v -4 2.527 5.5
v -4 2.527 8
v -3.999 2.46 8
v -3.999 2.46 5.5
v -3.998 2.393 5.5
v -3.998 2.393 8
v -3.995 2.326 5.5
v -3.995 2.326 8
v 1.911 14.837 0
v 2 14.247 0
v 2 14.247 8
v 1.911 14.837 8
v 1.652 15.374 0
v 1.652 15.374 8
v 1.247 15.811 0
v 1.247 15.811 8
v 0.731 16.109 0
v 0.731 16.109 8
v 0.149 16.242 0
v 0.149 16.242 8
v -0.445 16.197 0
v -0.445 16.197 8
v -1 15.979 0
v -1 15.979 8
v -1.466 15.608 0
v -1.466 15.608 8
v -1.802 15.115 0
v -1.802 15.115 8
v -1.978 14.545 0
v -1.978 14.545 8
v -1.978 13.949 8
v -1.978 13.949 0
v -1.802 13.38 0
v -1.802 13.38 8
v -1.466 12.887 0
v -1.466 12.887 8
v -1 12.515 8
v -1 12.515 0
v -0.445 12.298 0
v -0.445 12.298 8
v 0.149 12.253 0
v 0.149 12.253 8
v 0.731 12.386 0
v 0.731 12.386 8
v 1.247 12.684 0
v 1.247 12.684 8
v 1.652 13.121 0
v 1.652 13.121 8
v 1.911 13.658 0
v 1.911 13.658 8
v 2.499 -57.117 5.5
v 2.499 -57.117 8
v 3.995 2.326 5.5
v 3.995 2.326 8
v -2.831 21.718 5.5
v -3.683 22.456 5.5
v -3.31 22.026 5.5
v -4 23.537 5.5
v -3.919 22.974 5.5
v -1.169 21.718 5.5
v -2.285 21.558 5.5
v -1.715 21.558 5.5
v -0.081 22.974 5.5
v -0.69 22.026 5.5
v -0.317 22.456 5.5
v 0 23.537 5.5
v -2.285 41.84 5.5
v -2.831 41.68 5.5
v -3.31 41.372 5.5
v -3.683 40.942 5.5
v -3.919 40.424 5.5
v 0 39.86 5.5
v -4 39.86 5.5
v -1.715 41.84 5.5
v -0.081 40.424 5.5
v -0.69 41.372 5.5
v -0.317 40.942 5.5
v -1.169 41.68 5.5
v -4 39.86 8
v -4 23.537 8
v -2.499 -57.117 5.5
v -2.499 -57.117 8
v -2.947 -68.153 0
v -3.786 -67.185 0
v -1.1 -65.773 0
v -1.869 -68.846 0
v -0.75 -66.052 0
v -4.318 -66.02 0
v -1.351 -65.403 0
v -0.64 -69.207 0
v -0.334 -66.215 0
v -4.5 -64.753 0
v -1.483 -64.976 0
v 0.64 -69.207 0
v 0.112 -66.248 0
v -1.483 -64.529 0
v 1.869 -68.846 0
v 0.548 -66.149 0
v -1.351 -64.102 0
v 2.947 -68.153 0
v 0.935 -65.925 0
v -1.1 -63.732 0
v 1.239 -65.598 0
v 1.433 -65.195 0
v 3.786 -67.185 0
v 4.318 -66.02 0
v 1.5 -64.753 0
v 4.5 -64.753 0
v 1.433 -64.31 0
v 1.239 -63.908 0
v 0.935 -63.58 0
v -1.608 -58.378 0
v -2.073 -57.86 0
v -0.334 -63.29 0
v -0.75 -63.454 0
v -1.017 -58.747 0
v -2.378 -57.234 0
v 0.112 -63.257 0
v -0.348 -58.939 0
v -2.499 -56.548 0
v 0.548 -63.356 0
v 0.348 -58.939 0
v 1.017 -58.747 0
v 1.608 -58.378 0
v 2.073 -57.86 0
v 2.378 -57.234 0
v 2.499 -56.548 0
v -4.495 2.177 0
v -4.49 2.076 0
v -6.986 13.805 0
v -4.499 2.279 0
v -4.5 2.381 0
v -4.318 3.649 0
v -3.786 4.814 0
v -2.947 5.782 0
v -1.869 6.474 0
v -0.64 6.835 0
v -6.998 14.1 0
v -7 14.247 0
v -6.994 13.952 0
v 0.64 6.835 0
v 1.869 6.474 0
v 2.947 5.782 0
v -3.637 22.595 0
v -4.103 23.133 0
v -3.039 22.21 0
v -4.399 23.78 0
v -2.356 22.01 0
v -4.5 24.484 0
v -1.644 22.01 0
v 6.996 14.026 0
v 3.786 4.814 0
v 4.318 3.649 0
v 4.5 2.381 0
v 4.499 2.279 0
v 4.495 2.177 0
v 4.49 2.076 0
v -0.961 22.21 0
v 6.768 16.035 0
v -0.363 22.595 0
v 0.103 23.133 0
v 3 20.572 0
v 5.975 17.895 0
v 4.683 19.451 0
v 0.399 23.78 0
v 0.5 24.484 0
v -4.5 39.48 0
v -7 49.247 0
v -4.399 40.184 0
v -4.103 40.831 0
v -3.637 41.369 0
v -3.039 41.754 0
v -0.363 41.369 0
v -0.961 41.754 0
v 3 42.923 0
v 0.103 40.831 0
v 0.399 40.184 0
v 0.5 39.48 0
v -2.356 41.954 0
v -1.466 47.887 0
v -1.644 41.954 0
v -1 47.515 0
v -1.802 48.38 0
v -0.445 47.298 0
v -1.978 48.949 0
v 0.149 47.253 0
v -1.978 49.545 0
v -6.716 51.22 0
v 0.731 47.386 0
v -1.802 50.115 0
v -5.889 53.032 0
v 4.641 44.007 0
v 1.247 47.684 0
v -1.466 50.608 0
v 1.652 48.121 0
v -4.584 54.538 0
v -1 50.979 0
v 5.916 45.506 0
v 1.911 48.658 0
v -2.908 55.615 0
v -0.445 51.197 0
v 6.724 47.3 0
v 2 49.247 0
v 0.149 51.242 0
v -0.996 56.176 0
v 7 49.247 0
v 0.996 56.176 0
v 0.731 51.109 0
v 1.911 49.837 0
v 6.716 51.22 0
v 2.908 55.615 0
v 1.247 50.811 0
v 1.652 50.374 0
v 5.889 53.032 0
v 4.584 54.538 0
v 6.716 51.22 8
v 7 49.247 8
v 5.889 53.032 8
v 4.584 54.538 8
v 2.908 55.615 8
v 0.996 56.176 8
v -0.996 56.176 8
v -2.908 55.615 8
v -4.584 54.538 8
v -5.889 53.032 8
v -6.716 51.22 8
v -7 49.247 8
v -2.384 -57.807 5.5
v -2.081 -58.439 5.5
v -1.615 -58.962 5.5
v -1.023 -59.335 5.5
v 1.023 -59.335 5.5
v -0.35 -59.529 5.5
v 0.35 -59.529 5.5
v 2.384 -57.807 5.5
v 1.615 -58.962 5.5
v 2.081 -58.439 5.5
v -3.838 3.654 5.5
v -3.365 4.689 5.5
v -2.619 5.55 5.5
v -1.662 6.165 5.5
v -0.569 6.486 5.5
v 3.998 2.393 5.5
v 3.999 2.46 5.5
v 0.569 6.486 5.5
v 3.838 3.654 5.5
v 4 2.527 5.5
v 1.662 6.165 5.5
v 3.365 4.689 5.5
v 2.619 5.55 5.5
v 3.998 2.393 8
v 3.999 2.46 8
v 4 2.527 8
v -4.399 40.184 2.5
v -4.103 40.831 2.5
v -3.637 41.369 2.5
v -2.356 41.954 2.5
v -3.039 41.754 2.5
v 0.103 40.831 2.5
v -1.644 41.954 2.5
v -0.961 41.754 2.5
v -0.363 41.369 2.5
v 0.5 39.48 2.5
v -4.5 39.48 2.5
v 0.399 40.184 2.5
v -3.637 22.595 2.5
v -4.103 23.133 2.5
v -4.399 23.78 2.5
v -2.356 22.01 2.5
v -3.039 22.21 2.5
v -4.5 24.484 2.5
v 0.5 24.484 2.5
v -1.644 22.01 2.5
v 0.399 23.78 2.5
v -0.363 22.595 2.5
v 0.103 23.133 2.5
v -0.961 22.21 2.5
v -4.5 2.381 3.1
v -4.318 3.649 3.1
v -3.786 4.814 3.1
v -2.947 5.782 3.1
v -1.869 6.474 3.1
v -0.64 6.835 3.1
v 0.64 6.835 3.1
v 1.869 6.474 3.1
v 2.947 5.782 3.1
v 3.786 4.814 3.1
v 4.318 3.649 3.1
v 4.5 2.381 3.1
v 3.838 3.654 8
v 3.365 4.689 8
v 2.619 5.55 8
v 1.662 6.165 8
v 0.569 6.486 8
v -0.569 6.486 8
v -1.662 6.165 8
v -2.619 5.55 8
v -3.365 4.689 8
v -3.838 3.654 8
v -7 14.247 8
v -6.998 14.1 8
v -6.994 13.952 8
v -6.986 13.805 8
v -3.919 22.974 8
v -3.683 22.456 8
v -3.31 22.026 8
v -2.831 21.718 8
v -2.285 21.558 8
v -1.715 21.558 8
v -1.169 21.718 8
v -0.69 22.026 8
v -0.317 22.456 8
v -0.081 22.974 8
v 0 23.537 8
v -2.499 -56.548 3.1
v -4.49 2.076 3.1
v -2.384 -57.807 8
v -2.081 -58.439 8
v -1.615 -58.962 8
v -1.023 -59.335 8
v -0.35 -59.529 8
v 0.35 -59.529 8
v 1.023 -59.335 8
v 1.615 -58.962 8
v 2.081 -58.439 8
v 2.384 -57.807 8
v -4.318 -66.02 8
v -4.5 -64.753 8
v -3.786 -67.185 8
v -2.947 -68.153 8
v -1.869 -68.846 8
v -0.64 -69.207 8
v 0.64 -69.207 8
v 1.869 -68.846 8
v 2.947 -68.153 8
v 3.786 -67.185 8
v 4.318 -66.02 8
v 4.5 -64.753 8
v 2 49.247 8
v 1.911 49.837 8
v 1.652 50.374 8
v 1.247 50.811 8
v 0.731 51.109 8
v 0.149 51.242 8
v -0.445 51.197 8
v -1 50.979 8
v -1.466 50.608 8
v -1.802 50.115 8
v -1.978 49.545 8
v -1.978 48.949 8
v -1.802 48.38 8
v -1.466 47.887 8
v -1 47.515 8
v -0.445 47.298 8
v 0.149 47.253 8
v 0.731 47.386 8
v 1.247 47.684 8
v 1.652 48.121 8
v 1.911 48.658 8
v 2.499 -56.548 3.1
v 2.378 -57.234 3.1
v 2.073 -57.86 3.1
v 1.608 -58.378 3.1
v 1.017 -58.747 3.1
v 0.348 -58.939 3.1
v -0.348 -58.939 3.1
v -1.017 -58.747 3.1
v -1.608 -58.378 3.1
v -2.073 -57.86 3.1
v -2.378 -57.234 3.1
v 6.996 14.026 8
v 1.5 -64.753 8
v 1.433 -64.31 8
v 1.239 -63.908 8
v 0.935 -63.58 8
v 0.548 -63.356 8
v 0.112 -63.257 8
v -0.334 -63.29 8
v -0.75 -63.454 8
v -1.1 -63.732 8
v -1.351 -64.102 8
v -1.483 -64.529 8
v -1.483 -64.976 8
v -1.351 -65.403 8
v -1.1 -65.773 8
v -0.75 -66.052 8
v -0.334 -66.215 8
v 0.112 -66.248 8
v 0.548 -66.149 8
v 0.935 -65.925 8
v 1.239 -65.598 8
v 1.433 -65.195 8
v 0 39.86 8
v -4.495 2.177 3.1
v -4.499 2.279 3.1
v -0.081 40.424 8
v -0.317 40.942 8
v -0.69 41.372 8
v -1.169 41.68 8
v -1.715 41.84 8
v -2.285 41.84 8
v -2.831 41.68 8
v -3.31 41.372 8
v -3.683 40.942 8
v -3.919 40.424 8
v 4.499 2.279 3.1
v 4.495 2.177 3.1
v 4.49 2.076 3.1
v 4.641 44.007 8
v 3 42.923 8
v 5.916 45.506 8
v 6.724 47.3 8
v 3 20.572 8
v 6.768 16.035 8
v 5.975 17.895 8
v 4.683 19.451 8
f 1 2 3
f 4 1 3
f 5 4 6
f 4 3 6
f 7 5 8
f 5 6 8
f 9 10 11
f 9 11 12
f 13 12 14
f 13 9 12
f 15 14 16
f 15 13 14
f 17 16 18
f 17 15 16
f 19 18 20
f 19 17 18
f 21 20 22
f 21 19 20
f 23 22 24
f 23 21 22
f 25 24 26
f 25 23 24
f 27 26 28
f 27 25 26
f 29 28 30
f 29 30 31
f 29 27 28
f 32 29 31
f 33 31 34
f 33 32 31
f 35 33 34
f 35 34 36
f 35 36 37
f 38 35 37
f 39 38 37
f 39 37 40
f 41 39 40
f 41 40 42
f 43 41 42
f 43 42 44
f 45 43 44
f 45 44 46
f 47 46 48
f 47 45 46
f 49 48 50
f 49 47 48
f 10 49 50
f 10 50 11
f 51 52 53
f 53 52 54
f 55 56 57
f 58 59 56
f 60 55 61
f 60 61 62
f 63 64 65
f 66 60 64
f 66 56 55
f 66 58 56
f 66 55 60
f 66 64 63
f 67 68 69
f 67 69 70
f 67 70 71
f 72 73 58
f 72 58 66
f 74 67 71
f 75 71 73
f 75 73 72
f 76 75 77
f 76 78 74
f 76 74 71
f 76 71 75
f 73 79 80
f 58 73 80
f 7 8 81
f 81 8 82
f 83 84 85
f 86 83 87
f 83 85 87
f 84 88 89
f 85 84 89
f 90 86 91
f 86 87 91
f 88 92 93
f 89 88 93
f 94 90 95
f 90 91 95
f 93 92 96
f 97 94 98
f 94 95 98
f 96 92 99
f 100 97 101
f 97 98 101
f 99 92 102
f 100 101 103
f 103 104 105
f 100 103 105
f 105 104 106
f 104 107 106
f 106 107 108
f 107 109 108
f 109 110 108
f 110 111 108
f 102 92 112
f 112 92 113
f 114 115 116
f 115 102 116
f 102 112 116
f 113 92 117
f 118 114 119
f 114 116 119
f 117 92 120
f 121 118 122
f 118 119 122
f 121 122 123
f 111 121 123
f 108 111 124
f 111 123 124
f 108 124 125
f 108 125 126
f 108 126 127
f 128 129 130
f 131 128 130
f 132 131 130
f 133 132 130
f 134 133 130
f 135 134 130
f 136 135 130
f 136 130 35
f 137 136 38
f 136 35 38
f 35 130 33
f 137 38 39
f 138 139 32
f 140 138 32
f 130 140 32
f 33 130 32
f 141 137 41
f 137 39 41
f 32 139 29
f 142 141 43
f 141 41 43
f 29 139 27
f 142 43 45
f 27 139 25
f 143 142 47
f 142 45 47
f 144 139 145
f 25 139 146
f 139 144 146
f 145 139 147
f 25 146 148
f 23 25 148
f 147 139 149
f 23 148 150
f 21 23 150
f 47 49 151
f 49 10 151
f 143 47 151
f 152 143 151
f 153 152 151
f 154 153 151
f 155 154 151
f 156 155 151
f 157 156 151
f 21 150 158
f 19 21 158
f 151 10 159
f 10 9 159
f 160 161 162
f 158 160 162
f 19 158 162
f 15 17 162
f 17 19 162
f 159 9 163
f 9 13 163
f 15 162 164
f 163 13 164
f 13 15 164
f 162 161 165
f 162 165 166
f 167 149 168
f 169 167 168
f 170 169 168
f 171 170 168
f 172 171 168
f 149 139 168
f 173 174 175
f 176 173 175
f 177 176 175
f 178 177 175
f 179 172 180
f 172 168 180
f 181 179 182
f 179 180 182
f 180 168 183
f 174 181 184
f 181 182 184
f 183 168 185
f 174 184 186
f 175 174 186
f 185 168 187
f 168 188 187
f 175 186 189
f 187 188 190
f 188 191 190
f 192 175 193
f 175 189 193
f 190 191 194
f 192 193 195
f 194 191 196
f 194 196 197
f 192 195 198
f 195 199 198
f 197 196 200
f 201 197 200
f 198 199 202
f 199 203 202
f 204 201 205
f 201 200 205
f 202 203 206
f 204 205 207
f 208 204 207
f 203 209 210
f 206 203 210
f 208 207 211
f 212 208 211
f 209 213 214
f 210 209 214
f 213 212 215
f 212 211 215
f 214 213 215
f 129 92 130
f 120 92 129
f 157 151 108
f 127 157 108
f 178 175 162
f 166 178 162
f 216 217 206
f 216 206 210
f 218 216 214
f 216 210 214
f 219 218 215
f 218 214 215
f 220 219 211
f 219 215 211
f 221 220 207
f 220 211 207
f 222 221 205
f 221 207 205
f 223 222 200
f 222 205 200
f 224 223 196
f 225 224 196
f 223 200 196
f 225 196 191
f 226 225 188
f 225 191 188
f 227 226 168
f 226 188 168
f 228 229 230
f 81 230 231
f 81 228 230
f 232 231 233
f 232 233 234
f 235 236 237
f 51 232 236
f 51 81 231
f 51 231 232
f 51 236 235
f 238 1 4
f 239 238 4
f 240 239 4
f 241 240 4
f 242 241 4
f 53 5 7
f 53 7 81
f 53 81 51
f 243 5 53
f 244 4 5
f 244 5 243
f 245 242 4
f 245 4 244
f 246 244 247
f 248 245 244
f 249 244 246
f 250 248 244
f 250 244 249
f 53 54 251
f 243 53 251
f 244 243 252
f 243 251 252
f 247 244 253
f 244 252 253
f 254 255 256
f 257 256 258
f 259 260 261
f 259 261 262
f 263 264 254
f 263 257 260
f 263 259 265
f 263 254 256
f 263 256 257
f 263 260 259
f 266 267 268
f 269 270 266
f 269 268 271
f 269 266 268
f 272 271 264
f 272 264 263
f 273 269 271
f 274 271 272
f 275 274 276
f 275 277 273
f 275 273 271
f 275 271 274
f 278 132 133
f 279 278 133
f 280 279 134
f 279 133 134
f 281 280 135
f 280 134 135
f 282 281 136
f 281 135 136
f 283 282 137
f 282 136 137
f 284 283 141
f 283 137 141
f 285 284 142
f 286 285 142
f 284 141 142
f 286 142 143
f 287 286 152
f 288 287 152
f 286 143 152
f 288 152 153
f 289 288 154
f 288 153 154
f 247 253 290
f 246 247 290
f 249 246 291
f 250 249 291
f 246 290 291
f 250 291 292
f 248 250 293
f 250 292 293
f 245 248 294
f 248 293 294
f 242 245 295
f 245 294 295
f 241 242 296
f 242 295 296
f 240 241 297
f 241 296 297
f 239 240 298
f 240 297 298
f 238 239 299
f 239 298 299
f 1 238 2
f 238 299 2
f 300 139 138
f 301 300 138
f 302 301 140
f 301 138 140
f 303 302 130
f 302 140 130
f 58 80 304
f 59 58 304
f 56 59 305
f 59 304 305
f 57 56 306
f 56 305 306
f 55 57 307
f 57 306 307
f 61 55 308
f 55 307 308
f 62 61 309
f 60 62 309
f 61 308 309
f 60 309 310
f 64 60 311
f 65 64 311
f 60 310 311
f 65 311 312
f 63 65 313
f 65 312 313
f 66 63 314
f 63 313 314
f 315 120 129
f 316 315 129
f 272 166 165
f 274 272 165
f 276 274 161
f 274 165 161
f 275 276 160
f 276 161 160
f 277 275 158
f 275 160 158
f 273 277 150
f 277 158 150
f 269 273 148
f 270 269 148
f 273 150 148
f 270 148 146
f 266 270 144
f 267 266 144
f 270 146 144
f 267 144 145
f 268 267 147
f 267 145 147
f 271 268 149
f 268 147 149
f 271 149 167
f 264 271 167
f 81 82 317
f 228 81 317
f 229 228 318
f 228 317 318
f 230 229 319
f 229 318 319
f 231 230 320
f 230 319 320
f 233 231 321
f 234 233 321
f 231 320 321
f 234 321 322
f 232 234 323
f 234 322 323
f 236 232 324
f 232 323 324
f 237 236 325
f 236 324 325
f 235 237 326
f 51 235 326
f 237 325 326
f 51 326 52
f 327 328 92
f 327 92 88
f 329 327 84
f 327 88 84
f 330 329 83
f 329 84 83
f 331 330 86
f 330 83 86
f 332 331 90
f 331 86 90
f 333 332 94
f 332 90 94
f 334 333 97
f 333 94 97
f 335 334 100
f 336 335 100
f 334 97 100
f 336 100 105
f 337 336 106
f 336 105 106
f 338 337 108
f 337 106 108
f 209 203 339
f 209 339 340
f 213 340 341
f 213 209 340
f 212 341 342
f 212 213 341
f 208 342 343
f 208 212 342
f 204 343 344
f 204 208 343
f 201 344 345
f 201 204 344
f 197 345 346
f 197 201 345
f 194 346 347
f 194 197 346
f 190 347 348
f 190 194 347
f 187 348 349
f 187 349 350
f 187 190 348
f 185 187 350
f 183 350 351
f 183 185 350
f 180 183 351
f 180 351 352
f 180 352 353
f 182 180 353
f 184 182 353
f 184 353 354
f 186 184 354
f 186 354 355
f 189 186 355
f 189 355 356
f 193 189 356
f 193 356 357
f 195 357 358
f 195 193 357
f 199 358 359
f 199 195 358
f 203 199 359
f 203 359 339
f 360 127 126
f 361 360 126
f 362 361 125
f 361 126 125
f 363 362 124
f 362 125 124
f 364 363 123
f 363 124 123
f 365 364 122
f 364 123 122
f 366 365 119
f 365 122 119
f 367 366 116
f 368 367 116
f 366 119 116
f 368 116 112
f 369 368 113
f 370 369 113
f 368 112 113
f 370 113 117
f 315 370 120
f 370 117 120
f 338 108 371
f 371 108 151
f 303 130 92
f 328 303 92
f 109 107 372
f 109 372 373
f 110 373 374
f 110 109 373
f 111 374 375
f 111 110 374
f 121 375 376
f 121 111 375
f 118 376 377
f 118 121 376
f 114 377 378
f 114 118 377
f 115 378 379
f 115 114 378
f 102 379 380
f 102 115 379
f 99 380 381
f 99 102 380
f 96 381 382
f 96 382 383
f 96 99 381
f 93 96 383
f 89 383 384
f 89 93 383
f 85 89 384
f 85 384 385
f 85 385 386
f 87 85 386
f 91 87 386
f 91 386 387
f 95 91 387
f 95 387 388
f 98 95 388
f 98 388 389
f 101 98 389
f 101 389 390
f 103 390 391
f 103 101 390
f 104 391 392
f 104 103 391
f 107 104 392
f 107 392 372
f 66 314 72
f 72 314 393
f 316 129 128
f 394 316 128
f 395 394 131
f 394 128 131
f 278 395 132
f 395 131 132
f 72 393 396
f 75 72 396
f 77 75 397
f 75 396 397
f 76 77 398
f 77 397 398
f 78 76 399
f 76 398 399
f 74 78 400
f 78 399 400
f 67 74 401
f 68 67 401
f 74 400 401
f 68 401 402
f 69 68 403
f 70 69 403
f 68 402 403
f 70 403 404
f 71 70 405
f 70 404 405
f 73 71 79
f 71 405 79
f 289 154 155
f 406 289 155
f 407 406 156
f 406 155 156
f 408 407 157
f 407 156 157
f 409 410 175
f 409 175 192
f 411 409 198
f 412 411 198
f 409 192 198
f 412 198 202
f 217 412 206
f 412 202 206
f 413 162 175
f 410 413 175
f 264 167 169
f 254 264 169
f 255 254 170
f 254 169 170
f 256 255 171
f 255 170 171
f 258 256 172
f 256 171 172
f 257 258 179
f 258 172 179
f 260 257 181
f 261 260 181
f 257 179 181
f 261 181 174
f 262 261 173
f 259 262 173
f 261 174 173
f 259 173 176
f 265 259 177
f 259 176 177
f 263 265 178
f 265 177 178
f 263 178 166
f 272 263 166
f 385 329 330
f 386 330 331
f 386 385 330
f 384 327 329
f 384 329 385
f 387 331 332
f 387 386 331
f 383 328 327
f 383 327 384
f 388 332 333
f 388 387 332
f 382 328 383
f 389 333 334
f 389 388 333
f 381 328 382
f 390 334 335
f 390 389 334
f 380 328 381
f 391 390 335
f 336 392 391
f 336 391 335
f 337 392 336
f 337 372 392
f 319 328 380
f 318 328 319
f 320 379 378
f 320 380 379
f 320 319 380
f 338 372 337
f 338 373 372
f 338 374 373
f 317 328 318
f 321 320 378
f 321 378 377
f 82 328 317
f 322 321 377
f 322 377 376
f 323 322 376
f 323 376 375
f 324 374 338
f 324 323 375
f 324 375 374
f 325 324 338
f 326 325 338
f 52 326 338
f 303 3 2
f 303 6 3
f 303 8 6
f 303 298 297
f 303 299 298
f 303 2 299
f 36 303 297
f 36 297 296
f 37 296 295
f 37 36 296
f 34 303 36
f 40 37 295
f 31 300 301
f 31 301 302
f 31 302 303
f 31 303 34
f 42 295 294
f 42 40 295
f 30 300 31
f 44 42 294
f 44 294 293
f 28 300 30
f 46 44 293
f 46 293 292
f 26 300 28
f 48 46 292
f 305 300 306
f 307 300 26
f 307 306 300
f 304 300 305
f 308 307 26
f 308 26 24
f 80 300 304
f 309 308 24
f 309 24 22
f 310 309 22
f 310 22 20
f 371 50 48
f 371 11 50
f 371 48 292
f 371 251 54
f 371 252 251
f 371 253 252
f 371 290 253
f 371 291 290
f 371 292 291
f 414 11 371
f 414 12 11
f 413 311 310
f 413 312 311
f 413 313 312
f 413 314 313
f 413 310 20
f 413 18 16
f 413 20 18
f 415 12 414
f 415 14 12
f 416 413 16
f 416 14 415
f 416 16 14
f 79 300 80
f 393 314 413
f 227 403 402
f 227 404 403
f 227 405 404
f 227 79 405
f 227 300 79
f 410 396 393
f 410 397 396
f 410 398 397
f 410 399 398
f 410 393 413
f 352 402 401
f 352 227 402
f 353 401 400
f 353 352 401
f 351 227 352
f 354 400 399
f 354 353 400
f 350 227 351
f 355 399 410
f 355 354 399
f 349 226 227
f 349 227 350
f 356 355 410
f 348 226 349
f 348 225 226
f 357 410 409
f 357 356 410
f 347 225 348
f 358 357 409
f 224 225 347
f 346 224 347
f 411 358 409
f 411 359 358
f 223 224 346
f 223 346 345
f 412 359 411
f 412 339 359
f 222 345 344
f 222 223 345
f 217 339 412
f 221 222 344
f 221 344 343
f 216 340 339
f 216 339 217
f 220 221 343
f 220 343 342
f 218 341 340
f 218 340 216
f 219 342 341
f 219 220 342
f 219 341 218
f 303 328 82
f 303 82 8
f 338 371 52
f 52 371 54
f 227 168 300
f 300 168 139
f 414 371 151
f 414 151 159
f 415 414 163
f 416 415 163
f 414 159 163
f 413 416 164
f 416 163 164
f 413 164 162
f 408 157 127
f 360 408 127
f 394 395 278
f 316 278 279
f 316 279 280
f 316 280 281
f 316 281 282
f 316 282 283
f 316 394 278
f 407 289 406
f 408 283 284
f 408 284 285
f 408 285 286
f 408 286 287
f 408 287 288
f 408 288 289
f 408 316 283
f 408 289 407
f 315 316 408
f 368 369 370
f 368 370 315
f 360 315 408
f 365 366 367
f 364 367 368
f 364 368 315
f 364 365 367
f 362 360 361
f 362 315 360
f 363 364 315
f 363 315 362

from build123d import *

# Parameters (mm, degrees)
F0_R     = 2
F0_R_2   = 1.5
F1_DEPTH = 8
F3_DEPTH = 2.5
F5_DEPTH = 2.5
F7_DEPTH = 2.5
F9_DEPTH = 3.1


with BuildPart() as f1:
    # F0 (on Top) → F1 (new body)
    with BuildSketch(Plane.XY):
        with BuildLine():
            ThreePointArc((3, 42.922839), (5.91608, 45.505737), (7, 49.247394))
            ThreePointArc((7, 49.247394), (0, 56.247394), (-7, 49.247394))
            ThreePointArc((-7, 49.247394), (-3.741657, 43.331314), (3, 42.922839))
        make_face()
        with Locations((0, 49.247394)):
            Circle(F0_R, mode=Mode.SUBTRACT)
        with BuildLine():
            ThreePointArc((3, 42.922839), (-3.741657, 43.331314), (-7, 49.247394))
            Line((-7, 49.247394), (-7, 14.247394))
            Line((-7, 14.247394), (-6.985994, 13.804799))
            Line((-6.985994, 13.804799), (-4.5, -64.752606))
            ThreePointArc((-4.5, -64.752606), (0, -69.252606), (4.5, -64.752606))
            Line((4.5, -64.752606), (6.996488, 14.025675))
            ThreePointArc((6.996488, 14.025675), (5.974602, 17.894877), (3, 20.571949))
            Line((3, 20.571949), (3, 42.922839))
        make_face()
        with Locations((0, -64.752606)):
            Circle(F0_R_2, mode=Mode.SUBTRACT)
        with Locations((0, 14.247394)):
            Circle(F0_R, mode=Mode.SUBTRACT)
        with BuildLine():
            Line((-6.985994, 13.804799), (-7, 14.247394))
            ThreePointArc((-7, 14.247394), (-6.996498, 14.025986), (-6.985994, 13.804799))
        make_face()
    extrude(amount=F1_DEPTH)

    # F2 (on face) → F3 (cut)
    with BuildSketch(Plane.XY.offset(8)):
        with BuildLine():
            Line((4, 2.52692), (3.994938, 2.325746))
            ThreePointArc((3.994938, 2.325746), (3.998734, 2.426301), (4, 2.52692))
        make_face()
        with BuildLine():
            Line((2.499209, -57.116628), (3.994938, 2.325746))
            Line((3.994938, 2.325746), (4, 2.52692))
            ThreePointArc((4, 2.52692), (0, 6.52692), (-4, 2.52692))
            Line((-4, 2.52692), (-3.994938, 2.325746))
            Line((-3.994938, 2.325746), (-2.499209, -57.116628))
            ThreePointArc((-2.499209, -57.116628), (0, -59.553741), (2.499209, -57.116628))
        make_face()
        with BuildLine():
            Line((-3.994938, 2.325746), (-4, 2.52692))
            ThreePointArc((-4, 2.52692), (-3.998734, 2.426301), (-3.994938, 2.325746))
        make_face()
    extrude(amount=-F3_DEPTH, mode=Mode.SUBTRACT)

    # F4 (on face) → F5 (cut)
    with BuildSketch(Plane.XY.offset(8)):
        with BuildLine():
            Line((0, 23.537273), (0, 39.860327))
            ThreePointArc((0, 39.860327), (-2, 41.860327), (-4, 39.860327))
            Line((-4, 39.860327), (-4, 23.537273))
            ThreePointArc((-4, 23.537273), (-2, 21.537273), (0, 23.537273))
        make_face()
    extrude(amount=-F5_DEPTH, mode=Mode.SUBTRACT)

    # F6 (on face) → F7 (cut)
    with BuildSketch(Plane(origin=(0, 0, 0), x_dir=(1, 0, 0), z_dir=(0, 0, -1))):
        with BuildLine():
            Line((-4.5, -24.484327), (-4.5, -39.479643))
            ThreePointArc((-4.5, -39.479643), (-2, -41.979643), (0.5, -39.479643))
            Line((0.5, -39.479643), (0.5, -24.484327))
            ThreePointArc((0.5, -24.484327), (-2, -21.984327), (-4.5, -24.484327))
        make_face()
    extrude(amount=-F7_DEPTH, mode=Mode.SUBTRACT)

    # F8 (on face) → F9 (cut)
    with BuildSketch(Plane(origin=(0, 0, 0), x_dir=(1, 0, 0), z_dir=(0, 0, -1))):
        with BuildLine():
            Line((-4.5, -2.380997), (-4.48963, -2.075676))
            ThreePointArc((-4.48963, -2.075676), (-4.497407, -2.228248), (-4.5, -2.380997))
        make_face()
        with BuildLine():
            Line((-2.498559, 56.54796), (-4.48963, -2.075676))
            Line((-4.48963, -2.075676), (-4.5, -2.380997))
            ThreePointArc((-4.5, -2.380997), (0, -6.880997), (4.5, -2.380997))
            Line((4.5, -2.380997), (4.48963, -2.075676))
            Line((4.48963, -2.075676), (2.498559, 56.54796))
            ThreePointArc((2.498559, 56.54796), (0, 58.9631), (-2.498559, 56.54796))
        make_face()
        with BuildLine():
            Line((4.48963, -2.075676), (4.5, -2.380997))
            ThreePointArc((4.5, -2.380997), (4.497407, -2.228248), (4.48963, -2.075676))
        make_face()
    extrude(amount=-F9_DEPTH, mode=Mode.SUBTRACT)


solid = f1.part
